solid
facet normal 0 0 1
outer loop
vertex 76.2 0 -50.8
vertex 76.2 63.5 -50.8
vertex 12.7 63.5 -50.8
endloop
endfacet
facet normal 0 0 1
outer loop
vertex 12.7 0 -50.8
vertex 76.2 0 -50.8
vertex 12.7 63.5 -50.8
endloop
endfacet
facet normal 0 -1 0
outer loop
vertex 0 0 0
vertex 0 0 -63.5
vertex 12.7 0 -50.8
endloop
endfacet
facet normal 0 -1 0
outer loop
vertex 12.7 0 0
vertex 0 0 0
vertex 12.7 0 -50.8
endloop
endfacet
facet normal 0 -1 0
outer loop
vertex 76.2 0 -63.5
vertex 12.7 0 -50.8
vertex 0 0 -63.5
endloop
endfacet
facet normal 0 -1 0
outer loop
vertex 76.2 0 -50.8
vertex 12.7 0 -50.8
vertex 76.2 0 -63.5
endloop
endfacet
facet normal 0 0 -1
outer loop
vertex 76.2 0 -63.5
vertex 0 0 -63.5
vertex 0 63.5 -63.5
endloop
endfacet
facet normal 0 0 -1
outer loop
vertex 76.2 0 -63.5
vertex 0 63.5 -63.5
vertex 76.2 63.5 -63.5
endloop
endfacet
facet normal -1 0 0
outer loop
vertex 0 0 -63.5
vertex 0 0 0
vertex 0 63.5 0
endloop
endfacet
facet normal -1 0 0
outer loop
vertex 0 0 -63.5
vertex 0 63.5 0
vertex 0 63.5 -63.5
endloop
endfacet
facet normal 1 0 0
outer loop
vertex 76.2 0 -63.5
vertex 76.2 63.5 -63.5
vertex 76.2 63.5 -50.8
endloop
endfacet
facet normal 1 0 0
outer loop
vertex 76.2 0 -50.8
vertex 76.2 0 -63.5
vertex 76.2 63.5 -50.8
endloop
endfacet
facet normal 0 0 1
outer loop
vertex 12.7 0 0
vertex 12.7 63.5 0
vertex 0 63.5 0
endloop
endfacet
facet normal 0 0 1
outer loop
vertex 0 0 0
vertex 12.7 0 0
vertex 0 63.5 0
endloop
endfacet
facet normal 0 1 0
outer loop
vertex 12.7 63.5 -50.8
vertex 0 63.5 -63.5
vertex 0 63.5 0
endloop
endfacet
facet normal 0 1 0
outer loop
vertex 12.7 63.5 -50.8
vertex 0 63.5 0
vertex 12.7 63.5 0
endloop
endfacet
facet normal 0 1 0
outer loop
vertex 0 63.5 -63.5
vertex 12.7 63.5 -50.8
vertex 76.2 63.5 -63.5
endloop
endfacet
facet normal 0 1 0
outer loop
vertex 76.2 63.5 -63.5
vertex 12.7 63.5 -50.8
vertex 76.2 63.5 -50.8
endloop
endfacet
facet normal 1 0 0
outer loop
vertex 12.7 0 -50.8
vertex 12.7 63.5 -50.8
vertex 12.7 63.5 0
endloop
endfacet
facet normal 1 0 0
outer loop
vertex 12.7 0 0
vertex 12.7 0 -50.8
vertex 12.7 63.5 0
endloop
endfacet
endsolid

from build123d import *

# Parameters (mm, degrees)
F0_W     = 12.7
F0_H     = 12.7
F0_W_2   = 50.8
F1_DEPTH = 63.5


with BuildPart() as f1:
    # F0 (on Front) → F1 (new body)
    with BuildSketch(Plane.XZ):
        with Locations((69.85, -57.15)):
            Rectangle(F0_W, F0_H)
        with Locations((38.1, -57.15)):
            Rectangle(F0_W_2, F0_H)
        Polygon((12.7, 0), (0, 0), (0, -63.5), (12.7, -63.5), (12.7, -50.8), align=None)
    extrude(amount=-F1_DEPTH)


solid = f1.part
